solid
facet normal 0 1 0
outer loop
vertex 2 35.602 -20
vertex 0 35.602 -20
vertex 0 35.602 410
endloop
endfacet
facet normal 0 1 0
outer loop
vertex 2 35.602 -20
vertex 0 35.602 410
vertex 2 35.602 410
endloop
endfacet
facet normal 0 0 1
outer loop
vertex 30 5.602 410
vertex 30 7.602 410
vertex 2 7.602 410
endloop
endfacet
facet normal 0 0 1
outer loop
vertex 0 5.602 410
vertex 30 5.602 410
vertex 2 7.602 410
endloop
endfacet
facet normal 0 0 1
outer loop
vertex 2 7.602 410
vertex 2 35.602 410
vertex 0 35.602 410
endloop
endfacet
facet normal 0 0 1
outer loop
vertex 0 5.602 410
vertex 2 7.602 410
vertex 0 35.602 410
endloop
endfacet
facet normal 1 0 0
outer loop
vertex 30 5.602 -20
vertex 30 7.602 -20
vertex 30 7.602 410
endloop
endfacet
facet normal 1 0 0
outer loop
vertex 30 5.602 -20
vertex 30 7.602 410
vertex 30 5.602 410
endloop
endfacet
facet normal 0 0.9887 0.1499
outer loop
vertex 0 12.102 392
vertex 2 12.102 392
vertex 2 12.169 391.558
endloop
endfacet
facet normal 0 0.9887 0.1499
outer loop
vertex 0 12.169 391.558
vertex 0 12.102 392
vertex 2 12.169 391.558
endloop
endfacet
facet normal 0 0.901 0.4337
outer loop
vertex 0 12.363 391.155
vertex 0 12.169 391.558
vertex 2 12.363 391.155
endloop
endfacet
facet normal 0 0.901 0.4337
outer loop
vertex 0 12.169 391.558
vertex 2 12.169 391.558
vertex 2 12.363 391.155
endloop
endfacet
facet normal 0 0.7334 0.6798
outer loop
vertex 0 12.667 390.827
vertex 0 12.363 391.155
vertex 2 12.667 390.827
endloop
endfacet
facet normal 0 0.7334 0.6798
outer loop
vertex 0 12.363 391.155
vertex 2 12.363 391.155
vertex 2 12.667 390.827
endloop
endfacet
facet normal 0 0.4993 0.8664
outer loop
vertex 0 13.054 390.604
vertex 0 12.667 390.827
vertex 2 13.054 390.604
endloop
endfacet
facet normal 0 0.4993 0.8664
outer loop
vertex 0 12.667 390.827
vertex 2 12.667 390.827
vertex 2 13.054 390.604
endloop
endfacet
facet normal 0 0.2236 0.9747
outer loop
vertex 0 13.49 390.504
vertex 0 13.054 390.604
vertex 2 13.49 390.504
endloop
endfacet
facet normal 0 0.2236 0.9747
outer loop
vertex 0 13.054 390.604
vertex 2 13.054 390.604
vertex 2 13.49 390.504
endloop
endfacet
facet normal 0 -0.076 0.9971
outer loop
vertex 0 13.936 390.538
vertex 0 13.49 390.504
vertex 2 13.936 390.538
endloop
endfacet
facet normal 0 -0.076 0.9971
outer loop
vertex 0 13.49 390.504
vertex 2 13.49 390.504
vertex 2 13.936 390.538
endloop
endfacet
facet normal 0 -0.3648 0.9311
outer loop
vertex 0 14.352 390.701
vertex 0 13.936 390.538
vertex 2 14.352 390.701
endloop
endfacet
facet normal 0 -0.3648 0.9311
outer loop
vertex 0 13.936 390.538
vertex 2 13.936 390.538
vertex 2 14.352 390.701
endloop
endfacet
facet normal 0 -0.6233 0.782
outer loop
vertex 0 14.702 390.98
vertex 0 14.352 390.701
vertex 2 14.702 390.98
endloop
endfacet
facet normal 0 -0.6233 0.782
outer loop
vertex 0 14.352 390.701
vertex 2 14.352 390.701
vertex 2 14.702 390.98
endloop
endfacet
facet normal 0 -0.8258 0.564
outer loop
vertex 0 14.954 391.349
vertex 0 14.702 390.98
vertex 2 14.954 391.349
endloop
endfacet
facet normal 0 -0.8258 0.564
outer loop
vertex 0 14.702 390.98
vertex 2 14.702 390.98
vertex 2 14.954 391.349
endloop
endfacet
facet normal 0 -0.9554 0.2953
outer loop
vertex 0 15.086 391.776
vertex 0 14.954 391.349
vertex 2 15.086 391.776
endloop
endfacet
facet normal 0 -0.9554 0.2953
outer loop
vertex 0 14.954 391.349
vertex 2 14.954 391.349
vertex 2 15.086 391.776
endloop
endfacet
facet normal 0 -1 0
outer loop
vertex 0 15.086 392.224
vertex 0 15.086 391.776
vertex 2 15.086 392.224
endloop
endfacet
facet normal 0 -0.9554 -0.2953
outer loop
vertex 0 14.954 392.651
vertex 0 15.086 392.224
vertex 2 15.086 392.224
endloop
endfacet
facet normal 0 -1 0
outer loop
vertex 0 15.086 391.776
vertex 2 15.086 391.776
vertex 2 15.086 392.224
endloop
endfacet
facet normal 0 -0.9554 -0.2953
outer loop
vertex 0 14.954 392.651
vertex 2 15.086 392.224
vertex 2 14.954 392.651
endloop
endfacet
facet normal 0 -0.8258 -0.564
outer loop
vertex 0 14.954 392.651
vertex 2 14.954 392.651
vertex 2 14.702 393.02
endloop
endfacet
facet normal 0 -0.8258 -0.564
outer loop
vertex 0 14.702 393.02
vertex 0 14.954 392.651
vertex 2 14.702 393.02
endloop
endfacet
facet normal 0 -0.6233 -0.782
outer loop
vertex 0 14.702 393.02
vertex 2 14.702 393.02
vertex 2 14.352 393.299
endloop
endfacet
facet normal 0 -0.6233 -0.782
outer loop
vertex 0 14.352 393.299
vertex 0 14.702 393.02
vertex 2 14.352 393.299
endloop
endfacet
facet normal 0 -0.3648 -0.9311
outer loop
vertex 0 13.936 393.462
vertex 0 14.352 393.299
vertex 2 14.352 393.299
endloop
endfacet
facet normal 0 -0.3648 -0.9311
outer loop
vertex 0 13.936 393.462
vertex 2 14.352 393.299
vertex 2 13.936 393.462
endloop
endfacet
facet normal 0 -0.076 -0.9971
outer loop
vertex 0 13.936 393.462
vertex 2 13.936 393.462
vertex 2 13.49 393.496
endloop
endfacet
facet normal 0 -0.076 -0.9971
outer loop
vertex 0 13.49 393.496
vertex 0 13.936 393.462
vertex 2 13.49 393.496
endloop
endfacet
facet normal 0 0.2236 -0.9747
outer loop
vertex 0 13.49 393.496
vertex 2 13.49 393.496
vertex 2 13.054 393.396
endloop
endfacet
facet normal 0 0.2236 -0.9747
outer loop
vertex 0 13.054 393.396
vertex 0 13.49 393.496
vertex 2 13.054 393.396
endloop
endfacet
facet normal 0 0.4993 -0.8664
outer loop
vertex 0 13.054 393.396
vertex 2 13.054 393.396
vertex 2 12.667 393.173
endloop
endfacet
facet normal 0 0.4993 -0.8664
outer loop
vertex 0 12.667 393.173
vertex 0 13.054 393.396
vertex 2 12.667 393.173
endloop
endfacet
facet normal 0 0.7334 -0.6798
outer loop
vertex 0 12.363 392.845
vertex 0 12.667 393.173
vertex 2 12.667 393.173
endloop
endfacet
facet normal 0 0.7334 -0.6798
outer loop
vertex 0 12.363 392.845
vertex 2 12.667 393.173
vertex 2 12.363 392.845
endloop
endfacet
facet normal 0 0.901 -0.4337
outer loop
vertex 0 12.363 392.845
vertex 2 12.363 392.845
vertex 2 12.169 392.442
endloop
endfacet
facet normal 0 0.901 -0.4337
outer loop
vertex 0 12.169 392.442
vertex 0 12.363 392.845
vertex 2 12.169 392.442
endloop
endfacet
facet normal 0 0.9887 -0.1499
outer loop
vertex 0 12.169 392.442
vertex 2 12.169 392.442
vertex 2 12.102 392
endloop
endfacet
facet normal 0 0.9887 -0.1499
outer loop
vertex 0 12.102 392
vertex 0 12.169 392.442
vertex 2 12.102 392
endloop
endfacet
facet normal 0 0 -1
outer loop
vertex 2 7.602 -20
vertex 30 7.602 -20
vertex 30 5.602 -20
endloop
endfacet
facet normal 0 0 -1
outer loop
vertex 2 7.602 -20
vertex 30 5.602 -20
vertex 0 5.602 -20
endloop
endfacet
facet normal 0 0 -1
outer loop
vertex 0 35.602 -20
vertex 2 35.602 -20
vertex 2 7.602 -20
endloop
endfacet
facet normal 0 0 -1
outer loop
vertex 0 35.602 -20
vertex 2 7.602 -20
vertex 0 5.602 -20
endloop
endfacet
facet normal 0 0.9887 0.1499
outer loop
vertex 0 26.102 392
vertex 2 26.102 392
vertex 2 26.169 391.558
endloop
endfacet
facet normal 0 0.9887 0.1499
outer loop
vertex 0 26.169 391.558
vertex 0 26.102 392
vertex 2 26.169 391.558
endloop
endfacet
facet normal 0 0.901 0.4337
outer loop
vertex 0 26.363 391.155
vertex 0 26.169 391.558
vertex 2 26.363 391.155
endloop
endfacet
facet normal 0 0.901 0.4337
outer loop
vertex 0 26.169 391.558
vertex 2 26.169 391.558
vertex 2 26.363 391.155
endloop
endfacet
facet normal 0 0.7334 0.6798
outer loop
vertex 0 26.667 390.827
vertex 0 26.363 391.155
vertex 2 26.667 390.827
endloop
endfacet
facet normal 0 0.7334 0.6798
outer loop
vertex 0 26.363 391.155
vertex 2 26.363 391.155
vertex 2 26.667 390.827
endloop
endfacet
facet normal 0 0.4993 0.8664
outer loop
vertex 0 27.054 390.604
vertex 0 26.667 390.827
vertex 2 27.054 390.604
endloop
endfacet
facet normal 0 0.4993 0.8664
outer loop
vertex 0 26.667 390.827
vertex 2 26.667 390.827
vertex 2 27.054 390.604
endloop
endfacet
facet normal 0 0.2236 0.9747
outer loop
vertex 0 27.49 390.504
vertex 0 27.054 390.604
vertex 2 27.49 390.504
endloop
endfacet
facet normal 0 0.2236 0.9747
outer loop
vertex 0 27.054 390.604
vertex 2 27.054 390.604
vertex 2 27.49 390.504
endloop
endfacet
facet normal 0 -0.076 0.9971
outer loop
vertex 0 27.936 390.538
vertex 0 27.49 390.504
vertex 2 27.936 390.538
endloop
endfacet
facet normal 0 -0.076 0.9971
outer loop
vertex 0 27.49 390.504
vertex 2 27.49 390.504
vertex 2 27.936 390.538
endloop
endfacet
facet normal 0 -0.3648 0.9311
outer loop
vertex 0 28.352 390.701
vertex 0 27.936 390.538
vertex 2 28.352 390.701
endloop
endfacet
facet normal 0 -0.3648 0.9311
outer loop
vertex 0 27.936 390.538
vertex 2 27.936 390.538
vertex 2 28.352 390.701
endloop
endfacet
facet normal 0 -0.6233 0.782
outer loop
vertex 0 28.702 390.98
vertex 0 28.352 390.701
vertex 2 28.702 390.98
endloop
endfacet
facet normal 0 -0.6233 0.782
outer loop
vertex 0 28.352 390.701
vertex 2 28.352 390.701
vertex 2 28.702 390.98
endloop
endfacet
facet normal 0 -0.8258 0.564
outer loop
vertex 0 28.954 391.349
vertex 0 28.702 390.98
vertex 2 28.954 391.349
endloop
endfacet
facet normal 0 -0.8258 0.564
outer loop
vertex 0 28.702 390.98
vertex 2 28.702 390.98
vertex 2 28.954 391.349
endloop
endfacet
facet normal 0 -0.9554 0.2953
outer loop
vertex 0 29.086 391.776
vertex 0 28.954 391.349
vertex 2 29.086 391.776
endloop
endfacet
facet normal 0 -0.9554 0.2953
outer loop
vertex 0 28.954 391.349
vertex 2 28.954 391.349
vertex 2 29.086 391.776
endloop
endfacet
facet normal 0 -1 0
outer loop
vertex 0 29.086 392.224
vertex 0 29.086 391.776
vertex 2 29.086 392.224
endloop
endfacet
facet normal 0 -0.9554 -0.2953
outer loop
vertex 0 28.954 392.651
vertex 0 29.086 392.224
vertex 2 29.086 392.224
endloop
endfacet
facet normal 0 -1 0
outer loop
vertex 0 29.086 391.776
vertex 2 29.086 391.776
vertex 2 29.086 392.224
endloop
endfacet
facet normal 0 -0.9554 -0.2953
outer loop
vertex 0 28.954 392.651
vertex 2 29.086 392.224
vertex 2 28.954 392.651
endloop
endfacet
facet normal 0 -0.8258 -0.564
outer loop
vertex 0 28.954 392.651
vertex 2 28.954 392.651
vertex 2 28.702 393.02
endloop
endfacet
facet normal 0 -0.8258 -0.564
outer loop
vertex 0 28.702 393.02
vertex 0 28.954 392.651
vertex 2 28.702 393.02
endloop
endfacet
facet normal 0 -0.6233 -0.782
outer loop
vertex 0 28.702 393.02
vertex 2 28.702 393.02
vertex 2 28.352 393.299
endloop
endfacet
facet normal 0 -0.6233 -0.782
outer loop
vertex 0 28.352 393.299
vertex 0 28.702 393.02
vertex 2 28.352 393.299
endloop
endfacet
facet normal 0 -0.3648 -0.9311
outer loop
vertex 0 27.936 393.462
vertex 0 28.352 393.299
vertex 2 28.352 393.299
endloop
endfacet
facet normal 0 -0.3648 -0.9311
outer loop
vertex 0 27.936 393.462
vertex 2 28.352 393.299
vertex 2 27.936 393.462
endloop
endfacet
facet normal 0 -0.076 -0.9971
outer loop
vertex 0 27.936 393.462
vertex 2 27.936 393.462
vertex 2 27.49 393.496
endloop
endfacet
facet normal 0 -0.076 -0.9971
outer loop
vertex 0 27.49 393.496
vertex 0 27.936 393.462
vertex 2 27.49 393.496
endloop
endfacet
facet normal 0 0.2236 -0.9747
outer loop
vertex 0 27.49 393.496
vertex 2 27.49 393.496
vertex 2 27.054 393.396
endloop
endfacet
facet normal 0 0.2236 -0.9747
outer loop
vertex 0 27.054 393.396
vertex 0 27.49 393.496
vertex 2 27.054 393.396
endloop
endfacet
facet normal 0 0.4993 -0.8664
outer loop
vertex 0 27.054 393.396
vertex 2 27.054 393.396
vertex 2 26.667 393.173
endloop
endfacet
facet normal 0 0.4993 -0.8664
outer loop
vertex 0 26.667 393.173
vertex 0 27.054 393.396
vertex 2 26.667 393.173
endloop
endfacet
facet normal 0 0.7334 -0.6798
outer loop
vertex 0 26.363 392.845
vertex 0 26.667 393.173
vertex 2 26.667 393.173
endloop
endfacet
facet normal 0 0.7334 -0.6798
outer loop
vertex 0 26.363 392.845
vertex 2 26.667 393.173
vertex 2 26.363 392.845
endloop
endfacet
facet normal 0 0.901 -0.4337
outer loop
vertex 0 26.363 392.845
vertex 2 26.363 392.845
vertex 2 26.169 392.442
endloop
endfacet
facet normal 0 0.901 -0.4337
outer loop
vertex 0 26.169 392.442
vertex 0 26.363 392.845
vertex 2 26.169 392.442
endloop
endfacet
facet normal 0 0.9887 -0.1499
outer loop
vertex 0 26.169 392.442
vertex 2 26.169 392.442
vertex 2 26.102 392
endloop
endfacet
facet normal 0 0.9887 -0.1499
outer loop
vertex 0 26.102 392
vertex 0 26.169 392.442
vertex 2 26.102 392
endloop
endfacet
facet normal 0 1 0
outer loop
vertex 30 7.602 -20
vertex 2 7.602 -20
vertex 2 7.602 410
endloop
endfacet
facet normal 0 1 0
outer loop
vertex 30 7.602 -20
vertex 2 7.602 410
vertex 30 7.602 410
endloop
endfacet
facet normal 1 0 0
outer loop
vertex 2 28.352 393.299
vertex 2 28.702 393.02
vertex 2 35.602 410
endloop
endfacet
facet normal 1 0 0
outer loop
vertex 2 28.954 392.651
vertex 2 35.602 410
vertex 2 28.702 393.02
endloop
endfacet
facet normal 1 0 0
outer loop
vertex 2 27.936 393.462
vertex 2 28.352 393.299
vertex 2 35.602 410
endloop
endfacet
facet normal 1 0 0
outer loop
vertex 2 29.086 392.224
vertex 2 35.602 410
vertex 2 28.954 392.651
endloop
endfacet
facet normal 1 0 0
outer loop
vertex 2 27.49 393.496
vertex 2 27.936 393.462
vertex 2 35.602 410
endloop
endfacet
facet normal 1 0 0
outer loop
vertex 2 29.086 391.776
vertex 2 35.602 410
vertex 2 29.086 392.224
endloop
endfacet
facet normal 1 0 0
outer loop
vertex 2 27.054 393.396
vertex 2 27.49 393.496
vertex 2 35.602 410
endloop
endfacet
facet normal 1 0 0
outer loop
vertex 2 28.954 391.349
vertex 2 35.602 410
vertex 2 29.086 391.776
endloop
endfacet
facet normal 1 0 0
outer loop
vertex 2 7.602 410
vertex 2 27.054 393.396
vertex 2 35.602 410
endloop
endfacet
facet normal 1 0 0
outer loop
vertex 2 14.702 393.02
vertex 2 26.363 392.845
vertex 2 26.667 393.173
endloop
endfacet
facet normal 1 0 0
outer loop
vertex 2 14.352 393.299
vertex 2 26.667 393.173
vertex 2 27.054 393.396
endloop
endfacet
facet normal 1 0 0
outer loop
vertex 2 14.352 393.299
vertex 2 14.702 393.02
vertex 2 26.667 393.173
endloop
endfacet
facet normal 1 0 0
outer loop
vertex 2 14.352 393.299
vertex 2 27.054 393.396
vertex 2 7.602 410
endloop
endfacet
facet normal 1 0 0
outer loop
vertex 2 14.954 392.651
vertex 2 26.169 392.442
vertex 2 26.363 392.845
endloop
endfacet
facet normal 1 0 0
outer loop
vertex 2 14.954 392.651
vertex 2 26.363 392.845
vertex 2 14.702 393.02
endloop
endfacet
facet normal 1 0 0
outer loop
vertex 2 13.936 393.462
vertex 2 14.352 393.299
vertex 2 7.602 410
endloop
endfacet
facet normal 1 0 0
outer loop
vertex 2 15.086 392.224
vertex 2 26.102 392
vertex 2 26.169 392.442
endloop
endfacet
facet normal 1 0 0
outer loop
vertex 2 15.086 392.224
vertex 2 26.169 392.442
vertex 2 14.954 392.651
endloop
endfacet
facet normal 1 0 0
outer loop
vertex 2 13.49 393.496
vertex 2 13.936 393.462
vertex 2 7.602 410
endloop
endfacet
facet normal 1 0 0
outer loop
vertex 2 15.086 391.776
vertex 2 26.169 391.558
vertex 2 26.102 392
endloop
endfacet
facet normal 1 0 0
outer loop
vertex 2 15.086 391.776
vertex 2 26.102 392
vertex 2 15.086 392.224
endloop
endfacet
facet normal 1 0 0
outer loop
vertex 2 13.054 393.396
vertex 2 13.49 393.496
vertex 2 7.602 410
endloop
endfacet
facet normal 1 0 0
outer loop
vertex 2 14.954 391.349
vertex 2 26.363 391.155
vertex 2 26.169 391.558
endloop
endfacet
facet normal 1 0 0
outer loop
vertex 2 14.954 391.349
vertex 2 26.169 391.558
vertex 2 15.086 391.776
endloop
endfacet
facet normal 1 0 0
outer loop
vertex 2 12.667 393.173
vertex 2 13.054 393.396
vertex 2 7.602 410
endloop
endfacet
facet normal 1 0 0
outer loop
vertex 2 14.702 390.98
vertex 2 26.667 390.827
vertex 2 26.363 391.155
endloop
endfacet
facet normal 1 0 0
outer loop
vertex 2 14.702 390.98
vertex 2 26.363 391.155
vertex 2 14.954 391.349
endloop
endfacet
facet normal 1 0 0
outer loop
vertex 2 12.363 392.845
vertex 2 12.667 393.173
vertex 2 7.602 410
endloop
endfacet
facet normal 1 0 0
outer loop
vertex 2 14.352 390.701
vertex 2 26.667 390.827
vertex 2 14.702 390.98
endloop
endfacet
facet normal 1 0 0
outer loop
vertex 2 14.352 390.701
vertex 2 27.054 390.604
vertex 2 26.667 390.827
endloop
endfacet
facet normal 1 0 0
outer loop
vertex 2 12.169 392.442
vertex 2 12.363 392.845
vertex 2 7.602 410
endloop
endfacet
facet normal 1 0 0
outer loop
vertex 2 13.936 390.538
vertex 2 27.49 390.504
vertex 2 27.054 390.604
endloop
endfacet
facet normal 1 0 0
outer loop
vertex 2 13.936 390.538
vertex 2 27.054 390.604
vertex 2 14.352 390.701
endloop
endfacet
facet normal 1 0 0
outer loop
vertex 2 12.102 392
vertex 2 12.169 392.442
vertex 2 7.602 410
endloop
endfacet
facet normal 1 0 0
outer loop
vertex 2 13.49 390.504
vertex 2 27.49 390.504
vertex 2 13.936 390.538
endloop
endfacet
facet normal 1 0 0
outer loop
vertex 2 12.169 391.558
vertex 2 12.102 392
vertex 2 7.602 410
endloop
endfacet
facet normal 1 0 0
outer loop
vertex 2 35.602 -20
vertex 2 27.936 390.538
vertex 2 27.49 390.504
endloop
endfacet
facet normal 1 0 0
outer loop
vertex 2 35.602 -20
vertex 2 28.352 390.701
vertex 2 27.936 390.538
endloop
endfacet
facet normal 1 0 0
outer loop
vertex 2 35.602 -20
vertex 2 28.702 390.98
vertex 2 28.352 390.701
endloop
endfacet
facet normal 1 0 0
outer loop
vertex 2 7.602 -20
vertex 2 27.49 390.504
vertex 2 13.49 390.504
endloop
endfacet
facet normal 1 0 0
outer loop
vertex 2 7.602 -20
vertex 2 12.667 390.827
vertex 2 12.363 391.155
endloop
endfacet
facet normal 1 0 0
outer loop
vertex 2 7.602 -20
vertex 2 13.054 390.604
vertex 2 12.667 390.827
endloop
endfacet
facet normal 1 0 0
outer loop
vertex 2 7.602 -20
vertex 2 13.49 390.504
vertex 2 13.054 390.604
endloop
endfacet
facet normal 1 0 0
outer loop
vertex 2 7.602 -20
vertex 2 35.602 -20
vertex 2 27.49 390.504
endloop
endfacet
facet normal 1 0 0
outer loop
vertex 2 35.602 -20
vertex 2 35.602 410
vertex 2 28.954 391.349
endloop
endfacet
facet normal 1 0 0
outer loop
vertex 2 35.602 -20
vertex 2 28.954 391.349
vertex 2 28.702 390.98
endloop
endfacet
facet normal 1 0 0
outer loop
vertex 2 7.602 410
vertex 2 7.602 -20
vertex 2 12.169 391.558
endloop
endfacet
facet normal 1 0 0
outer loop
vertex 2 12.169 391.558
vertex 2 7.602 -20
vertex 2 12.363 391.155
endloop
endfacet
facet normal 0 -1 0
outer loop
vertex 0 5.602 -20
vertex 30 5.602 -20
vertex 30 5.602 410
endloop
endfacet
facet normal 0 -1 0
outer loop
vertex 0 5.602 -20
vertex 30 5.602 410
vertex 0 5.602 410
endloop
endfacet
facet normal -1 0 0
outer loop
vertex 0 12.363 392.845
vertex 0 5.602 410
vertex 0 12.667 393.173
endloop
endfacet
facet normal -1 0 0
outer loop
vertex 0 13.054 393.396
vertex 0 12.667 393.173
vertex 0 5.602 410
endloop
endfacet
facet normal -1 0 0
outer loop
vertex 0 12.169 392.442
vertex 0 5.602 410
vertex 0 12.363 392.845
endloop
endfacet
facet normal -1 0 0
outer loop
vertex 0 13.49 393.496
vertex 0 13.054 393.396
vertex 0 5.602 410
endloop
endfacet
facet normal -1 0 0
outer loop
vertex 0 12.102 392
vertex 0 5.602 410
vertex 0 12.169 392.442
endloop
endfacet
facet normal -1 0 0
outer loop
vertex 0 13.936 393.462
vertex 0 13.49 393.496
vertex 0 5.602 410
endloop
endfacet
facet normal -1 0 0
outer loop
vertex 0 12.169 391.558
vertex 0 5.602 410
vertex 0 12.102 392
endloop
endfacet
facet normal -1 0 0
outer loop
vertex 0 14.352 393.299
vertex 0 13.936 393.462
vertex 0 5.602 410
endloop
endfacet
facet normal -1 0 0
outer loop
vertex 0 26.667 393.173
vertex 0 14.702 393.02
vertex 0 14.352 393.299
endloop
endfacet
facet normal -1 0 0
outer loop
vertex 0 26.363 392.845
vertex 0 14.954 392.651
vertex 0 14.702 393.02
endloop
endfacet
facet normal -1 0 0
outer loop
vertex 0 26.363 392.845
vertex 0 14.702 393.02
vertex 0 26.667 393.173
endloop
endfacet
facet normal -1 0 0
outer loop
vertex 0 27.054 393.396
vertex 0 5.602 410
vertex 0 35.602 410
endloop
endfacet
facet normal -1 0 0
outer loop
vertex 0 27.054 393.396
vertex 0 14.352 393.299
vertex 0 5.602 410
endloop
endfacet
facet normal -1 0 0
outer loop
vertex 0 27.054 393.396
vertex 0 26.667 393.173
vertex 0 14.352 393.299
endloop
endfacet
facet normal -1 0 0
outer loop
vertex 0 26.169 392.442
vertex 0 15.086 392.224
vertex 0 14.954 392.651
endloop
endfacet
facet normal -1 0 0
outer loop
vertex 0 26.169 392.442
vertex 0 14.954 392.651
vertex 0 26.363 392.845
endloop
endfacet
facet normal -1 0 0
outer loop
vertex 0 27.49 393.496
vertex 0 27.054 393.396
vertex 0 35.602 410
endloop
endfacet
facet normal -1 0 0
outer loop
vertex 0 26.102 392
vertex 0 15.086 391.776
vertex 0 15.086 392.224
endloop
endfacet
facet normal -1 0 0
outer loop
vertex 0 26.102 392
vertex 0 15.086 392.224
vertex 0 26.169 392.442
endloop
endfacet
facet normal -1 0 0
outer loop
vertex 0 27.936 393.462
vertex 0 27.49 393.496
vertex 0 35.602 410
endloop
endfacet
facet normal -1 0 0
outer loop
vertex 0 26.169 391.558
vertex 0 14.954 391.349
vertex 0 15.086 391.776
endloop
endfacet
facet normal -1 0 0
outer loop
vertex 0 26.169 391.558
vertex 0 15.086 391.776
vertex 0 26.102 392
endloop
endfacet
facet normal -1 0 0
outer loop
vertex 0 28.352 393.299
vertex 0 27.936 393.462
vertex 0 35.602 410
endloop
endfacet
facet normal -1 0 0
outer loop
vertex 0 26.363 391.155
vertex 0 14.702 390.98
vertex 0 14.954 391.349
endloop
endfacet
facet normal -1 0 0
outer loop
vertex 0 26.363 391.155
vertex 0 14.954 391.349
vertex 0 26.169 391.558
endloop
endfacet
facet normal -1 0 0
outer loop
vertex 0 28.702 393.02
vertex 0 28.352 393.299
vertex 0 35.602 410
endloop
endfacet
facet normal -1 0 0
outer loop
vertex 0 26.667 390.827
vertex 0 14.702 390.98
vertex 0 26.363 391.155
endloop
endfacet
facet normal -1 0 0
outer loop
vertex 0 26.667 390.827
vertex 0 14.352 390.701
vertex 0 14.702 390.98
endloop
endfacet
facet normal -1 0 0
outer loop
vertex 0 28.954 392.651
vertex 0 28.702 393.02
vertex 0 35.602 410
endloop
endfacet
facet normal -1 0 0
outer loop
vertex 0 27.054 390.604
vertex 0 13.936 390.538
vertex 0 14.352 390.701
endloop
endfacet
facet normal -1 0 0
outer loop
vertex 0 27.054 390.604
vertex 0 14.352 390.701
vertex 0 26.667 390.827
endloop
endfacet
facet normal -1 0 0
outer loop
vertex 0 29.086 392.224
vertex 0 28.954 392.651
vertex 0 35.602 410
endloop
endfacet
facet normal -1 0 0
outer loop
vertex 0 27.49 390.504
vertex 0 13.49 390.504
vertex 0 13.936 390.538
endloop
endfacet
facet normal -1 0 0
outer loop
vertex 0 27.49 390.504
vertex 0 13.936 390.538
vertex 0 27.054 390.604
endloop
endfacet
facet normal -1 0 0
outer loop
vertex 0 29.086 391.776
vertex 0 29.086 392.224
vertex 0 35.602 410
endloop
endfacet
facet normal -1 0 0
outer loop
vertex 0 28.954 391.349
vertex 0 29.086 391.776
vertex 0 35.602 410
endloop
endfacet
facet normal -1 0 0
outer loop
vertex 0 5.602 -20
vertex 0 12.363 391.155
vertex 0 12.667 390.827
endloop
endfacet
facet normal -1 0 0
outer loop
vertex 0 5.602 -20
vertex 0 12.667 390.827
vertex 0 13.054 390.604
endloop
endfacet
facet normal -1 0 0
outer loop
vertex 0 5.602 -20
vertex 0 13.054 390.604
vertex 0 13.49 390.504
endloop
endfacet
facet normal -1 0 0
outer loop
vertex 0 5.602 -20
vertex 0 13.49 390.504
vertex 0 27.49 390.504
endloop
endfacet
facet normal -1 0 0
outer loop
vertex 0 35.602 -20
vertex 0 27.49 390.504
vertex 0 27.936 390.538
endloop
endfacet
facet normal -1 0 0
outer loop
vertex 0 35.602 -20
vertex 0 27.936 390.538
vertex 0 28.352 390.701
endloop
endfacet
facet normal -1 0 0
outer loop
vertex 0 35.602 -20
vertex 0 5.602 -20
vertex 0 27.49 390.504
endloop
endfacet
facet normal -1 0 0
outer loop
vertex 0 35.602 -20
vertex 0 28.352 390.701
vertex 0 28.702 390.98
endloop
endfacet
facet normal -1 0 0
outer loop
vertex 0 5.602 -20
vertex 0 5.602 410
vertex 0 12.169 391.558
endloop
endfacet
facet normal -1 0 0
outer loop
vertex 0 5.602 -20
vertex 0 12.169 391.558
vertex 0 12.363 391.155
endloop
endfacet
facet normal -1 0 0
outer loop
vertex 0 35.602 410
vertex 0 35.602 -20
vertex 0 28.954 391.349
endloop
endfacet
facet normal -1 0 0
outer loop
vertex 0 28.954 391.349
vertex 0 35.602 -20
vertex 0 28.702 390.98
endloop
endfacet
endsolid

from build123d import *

# Parameters (mm, degrees)
BOSS_EXTRUDE1_DEPTH      = 410
BOSS_EXTRUDE1_DEPTH_BACK = 20
F_3_0_3_DIAMETER_HOLE1_D = 3


with BuildPart() as part:
    # Sketch1 → Boss-Extrude1 (new, two sides: drawn at the far end of the back side and taken through both)
    with BuildSketch(Plane.XY.offset(-BOSS_EXTRUDE1_DEPTH_BACK)):
        Polygon((0, 5.602318429), (0, 35.602318429), (2, 35.602318429), (2, 7.602318429), (30, 7.602318429), (30, 5.602318429), align=None)
    extrude(amount=BOSS_EXTRUDE1_DEPTH + BOSS_EXTRUDE1_DEPTH_BACK)

    # Ø3.0 (3) Diameter Hole1 (through all)
    with Locations(Plane(origin=(0, 136.46431451, 221.32004832), x_dir=(0, 1, 0), z_dir=(-1, 0, 0))):
        with Locations((-122.861996081, -170.67995168), (-108.861996081, -170.67995168), (215.138003919, -170.67995168), (201.138003919, -170.67995168)):
            Hole(F_3_0_3_DIAMETER_HOLE1_D / 2)


solid = part.part
